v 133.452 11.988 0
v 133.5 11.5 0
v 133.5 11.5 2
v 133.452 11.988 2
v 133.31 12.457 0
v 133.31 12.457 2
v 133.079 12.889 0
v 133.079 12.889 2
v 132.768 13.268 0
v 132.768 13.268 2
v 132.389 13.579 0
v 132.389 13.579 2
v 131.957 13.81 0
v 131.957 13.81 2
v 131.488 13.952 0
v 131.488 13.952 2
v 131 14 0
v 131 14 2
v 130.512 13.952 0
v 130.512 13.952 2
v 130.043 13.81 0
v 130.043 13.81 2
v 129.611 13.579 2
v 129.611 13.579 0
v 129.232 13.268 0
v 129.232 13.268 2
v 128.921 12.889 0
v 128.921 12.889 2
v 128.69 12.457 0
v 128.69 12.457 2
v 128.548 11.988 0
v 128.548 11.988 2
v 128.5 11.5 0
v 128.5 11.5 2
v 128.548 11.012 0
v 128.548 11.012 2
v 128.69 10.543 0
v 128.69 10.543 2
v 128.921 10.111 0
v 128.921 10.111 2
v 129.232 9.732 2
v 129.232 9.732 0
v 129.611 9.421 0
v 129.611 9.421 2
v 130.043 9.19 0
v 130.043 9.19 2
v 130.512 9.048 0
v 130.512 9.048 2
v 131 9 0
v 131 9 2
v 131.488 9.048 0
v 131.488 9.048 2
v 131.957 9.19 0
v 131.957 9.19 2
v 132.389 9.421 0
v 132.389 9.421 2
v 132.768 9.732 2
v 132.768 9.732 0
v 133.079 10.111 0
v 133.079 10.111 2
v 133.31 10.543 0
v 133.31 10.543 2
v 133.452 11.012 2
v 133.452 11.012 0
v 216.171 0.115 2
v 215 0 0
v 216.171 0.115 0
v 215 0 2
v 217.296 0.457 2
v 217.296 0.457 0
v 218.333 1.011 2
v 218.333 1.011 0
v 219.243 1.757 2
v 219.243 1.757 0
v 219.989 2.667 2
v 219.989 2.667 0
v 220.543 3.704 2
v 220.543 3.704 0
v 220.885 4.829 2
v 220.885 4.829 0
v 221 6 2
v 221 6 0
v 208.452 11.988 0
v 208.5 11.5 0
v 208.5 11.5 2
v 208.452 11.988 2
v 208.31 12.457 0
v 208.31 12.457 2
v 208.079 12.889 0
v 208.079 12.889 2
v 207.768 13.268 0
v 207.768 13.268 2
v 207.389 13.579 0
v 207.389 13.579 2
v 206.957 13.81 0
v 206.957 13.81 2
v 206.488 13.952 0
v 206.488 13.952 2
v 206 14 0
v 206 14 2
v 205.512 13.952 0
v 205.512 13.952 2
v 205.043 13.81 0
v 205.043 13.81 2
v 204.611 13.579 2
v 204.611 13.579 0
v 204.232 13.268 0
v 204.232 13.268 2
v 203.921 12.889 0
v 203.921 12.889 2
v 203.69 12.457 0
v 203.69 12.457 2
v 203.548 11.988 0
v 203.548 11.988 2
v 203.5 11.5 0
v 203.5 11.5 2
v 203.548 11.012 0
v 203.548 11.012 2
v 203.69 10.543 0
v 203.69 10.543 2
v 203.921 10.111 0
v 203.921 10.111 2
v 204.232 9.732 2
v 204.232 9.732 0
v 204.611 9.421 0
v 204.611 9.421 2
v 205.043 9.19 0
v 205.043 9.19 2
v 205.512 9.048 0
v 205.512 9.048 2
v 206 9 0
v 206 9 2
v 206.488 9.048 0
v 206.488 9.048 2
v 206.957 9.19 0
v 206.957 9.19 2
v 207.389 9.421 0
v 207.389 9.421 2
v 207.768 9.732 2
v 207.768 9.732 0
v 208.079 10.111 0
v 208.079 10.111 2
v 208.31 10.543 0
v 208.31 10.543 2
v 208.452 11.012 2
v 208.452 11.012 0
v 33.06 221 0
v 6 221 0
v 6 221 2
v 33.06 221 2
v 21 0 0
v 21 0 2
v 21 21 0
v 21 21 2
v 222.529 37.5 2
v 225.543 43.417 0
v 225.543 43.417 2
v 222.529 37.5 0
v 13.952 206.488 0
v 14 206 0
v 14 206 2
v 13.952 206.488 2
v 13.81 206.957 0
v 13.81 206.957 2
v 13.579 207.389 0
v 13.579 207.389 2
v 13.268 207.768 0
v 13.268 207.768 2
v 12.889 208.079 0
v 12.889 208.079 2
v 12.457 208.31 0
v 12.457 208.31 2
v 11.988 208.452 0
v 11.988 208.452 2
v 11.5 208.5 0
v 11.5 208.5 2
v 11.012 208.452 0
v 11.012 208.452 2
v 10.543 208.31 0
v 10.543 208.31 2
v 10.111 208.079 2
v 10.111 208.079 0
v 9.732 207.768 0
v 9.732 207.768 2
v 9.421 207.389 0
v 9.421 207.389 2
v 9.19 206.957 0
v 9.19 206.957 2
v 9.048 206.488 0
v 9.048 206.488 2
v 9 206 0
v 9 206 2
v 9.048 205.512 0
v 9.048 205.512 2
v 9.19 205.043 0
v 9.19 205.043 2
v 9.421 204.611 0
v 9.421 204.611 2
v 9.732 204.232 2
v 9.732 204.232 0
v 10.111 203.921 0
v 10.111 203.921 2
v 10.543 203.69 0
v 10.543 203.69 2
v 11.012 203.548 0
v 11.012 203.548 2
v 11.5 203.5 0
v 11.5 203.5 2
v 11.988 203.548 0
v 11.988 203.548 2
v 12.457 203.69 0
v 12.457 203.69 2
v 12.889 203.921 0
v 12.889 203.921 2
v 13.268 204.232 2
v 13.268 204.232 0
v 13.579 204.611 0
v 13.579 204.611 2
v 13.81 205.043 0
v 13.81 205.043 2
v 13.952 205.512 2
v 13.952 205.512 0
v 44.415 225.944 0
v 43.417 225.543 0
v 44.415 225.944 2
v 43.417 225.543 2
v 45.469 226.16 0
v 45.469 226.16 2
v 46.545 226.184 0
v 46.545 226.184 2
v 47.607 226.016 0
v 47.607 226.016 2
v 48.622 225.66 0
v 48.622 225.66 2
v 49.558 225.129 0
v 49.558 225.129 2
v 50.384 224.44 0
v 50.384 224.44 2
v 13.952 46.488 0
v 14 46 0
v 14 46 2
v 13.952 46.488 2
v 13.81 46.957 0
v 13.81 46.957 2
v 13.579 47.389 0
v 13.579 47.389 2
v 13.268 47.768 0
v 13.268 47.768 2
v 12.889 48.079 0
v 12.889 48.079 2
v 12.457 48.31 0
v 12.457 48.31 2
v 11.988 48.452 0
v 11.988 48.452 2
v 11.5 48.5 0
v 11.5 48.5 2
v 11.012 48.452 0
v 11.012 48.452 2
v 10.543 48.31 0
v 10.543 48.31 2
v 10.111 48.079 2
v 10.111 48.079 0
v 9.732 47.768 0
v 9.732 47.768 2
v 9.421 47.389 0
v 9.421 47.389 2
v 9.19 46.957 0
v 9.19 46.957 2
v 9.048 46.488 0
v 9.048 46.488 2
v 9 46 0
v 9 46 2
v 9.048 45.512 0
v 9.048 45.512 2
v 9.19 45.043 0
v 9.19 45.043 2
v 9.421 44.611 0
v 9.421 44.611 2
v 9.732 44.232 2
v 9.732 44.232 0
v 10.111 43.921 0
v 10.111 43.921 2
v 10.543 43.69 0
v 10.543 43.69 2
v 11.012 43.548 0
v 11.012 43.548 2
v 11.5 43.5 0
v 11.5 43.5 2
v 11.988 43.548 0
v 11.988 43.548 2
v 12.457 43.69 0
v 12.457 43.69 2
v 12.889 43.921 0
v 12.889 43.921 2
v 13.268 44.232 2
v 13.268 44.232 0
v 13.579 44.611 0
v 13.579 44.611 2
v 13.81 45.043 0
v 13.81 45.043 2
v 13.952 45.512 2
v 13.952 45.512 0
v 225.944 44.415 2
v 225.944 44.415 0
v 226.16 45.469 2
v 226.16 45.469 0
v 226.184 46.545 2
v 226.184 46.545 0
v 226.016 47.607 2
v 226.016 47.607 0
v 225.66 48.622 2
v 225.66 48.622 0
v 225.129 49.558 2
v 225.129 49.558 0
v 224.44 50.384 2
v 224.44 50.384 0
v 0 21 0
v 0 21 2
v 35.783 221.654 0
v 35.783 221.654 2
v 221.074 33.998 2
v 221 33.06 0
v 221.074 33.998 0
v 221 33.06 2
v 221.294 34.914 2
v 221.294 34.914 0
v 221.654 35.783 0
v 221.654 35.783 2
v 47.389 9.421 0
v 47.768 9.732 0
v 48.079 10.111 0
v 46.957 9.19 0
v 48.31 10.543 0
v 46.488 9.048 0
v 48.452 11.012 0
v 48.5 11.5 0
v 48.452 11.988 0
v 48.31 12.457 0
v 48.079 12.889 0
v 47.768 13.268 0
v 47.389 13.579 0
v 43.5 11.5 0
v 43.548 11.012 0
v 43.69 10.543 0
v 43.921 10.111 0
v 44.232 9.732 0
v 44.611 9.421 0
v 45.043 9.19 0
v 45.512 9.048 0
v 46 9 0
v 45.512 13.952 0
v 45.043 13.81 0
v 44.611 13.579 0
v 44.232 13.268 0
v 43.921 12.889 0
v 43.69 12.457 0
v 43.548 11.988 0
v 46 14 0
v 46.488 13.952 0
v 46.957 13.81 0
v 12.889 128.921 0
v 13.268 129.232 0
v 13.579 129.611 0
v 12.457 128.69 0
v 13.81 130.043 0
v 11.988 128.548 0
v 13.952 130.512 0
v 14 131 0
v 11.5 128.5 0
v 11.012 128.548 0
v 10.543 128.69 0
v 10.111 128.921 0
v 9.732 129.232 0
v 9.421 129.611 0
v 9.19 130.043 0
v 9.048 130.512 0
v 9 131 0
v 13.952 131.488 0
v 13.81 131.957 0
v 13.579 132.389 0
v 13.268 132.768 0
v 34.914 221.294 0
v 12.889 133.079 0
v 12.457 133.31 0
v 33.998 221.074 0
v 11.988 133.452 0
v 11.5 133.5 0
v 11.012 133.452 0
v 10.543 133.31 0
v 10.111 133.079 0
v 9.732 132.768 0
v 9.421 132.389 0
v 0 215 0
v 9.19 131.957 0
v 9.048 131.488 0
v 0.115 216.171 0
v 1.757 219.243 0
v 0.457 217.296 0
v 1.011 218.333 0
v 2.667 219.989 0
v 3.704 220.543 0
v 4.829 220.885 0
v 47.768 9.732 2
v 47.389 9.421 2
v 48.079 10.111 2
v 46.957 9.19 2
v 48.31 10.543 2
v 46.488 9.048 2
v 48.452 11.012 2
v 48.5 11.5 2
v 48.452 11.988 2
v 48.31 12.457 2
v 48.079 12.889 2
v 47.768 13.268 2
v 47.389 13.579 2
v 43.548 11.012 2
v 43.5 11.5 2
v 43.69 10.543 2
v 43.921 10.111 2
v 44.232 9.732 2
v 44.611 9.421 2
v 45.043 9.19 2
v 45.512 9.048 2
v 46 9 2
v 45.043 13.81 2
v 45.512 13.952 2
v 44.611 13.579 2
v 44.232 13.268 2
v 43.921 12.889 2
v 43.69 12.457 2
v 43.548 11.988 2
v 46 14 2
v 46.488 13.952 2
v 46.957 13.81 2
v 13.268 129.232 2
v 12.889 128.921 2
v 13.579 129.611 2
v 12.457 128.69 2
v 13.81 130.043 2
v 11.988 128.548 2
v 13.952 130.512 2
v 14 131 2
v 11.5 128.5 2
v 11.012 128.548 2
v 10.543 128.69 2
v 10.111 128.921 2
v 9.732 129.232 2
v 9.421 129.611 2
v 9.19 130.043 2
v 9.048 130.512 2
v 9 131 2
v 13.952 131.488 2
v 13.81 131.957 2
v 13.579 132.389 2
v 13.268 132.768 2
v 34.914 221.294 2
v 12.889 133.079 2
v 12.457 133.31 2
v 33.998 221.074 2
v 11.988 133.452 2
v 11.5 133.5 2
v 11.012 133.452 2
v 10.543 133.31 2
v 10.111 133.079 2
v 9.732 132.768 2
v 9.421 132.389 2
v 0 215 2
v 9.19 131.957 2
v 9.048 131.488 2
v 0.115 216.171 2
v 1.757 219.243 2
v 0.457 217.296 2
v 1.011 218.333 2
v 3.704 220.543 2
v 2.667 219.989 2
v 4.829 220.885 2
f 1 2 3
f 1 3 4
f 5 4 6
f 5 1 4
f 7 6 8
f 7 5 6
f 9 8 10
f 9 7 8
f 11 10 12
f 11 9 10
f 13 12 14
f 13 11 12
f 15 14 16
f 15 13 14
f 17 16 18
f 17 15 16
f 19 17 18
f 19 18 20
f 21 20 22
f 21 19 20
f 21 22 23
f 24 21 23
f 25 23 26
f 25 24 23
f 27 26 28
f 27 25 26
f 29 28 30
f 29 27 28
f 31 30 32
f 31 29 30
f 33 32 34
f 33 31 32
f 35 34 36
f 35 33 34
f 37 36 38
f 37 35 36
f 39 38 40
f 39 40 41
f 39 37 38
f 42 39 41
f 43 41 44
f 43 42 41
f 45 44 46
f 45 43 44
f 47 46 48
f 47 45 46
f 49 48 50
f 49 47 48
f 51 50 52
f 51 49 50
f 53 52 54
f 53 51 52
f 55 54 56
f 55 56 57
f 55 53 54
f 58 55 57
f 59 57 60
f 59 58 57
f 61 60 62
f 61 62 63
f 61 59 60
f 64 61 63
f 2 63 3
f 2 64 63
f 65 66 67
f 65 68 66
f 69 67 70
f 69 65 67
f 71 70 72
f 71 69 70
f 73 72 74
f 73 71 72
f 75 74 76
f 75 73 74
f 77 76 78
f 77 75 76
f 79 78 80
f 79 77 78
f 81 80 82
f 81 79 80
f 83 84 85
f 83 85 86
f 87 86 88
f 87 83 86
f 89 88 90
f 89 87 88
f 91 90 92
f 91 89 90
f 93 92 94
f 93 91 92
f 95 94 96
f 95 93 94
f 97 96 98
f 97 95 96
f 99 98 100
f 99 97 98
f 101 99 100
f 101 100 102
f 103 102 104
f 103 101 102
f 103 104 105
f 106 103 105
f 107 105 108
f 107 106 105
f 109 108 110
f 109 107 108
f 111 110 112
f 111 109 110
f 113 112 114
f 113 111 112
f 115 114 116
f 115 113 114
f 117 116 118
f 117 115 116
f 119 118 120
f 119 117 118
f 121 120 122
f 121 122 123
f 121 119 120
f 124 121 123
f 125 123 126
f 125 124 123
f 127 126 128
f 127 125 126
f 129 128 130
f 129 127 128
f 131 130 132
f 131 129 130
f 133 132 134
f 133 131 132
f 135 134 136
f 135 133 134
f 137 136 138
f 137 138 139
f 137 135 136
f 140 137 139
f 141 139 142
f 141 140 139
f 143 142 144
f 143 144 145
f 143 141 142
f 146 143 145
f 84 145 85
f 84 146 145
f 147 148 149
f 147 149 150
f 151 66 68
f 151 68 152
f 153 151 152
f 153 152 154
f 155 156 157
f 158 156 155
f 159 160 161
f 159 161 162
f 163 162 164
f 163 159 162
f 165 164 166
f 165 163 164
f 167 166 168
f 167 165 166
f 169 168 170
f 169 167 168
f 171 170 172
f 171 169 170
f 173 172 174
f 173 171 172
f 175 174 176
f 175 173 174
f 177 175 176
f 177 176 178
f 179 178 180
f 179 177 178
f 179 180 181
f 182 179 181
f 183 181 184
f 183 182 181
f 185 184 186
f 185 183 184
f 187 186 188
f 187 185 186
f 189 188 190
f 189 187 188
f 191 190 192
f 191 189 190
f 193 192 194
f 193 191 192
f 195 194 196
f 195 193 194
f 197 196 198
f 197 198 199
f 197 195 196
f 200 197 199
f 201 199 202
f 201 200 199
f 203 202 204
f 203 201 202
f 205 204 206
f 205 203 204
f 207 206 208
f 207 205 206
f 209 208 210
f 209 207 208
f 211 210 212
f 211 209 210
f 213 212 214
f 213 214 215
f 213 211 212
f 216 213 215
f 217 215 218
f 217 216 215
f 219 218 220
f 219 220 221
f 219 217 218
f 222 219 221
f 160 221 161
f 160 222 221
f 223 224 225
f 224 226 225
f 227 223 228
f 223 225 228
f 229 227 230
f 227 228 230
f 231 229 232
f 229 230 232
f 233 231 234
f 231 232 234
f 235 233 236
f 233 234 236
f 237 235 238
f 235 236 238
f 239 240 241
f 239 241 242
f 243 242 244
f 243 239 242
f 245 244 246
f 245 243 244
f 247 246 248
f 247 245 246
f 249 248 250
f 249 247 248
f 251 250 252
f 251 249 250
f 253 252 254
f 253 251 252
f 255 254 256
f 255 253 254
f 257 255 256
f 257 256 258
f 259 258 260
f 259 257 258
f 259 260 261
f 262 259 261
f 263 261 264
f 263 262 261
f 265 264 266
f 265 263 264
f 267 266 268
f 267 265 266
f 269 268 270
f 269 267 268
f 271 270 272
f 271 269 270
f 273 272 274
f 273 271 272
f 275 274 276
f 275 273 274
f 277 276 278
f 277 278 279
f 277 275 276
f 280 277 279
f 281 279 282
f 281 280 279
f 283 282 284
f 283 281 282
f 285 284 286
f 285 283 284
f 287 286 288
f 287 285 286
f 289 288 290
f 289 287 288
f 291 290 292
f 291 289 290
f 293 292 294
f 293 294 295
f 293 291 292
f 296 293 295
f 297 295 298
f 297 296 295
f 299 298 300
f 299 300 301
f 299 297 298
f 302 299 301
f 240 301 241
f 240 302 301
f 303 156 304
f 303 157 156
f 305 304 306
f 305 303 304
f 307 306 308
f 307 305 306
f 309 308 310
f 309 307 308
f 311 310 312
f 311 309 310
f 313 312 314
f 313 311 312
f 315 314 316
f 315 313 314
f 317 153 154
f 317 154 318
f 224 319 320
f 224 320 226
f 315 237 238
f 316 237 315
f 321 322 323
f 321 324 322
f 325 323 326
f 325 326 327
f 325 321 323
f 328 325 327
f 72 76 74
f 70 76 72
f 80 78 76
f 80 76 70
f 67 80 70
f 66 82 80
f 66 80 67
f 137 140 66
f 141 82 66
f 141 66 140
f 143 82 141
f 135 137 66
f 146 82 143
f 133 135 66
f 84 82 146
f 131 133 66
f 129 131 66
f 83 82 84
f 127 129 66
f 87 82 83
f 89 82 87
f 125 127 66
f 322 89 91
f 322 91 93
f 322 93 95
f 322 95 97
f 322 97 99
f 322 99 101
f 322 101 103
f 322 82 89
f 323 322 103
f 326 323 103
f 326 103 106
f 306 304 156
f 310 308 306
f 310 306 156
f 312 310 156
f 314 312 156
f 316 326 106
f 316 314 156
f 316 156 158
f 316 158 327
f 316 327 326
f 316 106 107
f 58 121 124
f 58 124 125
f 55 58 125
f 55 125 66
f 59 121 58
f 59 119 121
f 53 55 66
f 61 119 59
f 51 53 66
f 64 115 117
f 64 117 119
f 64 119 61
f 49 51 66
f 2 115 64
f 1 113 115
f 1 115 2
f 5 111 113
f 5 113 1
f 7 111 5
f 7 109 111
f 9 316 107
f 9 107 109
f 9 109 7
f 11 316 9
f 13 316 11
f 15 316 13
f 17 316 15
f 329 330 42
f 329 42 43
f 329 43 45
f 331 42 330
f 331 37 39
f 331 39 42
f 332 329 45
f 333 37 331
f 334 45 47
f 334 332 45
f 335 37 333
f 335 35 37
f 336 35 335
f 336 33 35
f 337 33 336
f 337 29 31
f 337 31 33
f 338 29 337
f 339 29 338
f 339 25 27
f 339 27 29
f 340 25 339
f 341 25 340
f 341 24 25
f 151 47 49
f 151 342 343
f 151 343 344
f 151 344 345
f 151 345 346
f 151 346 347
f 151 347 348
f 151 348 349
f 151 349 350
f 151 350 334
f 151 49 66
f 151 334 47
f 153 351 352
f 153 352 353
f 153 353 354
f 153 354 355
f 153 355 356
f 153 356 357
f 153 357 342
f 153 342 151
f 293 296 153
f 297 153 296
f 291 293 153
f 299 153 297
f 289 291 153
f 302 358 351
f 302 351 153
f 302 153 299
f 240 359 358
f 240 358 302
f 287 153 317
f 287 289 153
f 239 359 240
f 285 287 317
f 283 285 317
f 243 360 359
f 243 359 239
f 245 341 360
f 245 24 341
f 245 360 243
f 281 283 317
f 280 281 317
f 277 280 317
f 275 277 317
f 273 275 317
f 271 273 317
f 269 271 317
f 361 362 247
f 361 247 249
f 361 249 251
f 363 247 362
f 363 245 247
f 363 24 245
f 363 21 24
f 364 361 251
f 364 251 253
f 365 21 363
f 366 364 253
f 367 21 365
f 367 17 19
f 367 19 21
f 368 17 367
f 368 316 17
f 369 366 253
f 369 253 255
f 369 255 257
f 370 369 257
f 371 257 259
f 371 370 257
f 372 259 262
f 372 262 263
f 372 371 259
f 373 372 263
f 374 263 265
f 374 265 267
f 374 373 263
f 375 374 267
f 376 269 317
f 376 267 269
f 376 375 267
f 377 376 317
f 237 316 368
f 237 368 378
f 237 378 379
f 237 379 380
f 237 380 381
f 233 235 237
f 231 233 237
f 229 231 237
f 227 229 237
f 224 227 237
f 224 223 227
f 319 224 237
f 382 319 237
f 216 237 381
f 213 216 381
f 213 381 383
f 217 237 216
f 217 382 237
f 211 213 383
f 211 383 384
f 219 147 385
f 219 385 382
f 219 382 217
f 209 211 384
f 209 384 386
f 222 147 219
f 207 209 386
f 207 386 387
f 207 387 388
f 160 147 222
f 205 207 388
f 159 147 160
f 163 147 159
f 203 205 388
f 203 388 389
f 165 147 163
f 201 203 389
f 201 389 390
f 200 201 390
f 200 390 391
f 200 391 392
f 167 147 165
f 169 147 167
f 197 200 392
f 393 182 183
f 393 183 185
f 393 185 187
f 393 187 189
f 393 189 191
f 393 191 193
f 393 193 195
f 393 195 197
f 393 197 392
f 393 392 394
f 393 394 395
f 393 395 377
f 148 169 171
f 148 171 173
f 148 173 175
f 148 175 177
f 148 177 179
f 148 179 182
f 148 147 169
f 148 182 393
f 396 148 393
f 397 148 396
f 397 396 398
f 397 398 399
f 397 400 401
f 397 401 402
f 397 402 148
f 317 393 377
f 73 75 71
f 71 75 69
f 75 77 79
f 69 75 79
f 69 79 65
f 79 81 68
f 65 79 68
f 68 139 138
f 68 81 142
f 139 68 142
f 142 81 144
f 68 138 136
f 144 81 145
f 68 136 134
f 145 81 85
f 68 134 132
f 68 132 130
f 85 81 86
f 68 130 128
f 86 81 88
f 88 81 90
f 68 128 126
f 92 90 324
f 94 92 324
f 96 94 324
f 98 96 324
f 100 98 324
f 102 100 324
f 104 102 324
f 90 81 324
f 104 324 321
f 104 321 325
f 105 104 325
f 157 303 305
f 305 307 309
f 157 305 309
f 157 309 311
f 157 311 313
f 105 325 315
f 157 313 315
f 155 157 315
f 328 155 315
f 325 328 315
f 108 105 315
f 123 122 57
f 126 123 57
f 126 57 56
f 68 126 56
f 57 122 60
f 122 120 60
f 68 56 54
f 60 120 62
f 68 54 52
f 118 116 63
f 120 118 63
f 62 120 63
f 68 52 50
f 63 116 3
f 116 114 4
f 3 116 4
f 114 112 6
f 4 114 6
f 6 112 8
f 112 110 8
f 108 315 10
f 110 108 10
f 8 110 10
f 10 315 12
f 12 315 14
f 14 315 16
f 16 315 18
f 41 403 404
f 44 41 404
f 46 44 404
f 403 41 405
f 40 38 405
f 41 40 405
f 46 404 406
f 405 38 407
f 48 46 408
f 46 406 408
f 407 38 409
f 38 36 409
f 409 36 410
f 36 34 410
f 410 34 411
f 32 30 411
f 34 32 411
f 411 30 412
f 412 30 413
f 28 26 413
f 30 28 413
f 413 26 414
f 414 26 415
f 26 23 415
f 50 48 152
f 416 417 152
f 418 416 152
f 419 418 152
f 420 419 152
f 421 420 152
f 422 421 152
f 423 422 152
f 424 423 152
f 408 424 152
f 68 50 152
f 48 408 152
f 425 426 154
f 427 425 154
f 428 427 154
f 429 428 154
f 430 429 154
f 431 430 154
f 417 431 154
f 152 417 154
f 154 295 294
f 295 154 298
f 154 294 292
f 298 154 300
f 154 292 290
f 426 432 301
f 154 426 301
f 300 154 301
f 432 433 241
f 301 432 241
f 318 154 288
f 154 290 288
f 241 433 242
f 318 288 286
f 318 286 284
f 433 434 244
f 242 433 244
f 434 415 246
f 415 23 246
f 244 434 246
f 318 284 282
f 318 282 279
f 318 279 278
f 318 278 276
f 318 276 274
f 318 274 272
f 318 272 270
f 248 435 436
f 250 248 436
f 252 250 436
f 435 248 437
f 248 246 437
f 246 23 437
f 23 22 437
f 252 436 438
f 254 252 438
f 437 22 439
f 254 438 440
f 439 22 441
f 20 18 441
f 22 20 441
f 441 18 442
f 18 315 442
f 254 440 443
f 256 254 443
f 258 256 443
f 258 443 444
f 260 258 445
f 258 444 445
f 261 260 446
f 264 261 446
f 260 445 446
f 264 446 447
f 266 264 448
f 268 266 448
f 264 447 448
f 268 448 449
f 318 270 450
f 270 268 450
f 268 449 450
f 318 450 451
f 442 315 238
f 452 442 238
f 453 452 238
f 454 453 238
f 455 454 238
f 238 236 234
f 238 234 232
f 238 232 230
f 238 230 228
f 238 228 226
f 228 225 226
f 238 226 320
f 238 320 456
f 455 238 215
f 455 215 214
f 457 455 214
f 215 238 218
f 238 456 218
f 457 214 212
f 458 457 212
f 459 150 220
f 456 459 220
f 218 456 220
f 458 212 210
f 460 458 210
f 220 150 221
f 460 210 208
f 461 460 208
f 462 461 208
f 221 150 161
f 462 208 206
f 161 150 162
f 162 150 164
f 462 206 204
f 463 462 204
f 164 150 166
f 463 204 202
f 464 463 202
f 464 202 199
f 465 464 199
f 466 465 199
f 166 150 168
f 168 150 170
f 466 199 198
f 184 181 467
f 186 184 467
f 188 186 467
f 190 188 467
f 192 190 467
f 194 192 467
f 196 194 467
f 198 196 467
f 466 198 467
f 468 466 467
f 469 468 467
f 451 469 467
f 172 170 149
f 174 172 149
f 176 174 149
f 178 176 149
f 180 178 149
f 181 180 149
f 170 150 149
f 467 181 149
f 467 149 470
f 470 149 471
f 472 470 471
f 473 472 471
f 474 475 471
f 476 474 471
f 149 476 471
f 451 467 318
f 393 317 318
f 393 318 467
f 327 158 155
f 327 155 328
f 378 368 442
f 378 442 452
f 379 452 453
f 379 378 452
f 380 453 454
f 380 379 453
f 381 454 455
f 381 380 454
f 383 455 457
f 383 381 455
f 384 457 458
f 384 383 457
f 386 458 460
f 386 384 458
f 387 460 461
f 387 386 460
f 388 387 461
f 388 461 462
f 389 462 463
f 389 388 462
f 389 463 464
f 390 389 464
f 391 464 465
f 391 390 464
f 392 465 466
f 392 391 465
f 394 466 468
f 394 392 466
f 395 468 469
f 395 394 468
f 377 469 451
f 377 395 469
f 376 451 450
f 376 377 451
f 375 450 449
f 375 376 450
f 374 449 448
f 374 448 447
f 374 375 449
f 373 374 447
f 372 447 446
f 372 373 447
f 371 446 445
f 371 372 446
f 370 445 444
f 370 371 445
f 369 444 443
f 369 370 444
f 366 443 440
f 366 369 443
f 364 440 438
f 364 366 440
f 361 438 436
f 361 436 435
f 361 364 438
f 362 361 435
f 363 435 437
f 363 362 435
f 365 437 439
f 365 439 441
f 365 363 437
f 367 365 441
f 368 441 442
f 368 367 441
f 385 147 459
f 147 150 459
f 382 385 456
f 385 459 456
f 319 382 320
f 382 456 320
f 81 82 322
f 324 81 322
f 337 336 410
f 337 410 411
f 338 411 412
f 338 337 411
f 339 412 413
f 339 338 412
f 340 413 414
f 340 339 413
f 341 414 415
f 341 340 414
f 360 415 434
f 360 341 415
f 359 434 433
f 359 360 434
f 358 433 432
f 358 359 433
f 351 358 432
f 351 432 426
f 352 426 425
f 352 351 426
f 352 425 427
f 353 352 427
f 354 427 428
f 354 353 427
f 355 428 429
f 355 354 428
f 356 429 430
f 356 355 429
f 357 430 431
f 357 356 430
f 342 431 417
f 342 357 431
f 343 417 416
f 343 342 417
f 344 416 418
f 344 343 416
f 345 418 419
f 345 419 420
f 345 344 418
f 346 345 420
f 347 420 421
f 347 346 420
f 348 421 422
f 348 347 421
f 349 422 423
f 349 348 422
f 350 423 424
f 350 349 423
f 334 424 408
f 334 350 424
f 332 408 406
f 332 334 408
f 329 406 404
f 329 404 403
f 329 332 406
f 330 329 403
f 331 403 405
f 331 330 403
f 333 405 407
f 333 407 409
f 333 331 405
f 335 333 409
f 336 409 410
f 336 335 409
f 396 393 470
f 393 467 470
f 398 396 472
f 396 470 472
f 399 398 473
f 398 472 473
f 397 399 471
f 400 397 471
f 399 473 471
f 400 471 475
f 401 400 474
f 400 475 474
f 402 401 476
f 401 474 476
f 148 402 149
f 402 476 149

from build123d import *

# Parameters (mm, degrees)
SKETCH_1_R      = 2.5
EXTRUDE_1_DEPTH = 2
FILLET_1_R      = 6


with BuildPart() as part:
    # 草圖1 → 擠出1 (new body)
    with BuildSketch(Plane.XY):
        Polygon((21, 0), (21, 21), (0, 21), (0, 221), (34.5, 221), (47.301071766, 227.522471846), (227.522471846, 47.301071766), (222.528576348, 37.5), (221, 34.5), (221, 21), (221, 0), align=None)
        with Locations((11.5, 46)):
            Circle(SKETCH_1_R, mode=Mode.SUBTRACT)
        with Locations((11.5, 131)):
            Circle(SKETCH_1_R, mode=Mode.SUBTRACT)
        with Locations((11.5, 206)):
            Circle(SKETCH_1_R, mode=Mode.SUBTRACT)
        with Locations((46, 11.5)):
            Circle(SKETCH_1_R, mode=Mode.SUBTRACT)
        with Locations((131, 11.5)):
            Circle(SKETCH_1_R, mode=Mode.SUBTRACT)
        with Locations((206, 11.5)):
            Circle(SKETCH_1_R, mode=Mode.SUBTRACT)
    extrude(amount=EXTRUDE_1_DEPTH)

    # 圓角1
    fillet_1_edges = [part.edges().sort_by_distance(p)[0] for p in [
        (0, 221, 1),
        (34.5, 221, 1),
        (47.301071766, 227.522471846, 1),
        (227.522471846, 47.301071766, 1),
        (221, 34.5, 1),
        (221, 0, 1),
    ]]
    fillet(fillet_1_edges, radius=FILLET_1_R)


solid = part.part
